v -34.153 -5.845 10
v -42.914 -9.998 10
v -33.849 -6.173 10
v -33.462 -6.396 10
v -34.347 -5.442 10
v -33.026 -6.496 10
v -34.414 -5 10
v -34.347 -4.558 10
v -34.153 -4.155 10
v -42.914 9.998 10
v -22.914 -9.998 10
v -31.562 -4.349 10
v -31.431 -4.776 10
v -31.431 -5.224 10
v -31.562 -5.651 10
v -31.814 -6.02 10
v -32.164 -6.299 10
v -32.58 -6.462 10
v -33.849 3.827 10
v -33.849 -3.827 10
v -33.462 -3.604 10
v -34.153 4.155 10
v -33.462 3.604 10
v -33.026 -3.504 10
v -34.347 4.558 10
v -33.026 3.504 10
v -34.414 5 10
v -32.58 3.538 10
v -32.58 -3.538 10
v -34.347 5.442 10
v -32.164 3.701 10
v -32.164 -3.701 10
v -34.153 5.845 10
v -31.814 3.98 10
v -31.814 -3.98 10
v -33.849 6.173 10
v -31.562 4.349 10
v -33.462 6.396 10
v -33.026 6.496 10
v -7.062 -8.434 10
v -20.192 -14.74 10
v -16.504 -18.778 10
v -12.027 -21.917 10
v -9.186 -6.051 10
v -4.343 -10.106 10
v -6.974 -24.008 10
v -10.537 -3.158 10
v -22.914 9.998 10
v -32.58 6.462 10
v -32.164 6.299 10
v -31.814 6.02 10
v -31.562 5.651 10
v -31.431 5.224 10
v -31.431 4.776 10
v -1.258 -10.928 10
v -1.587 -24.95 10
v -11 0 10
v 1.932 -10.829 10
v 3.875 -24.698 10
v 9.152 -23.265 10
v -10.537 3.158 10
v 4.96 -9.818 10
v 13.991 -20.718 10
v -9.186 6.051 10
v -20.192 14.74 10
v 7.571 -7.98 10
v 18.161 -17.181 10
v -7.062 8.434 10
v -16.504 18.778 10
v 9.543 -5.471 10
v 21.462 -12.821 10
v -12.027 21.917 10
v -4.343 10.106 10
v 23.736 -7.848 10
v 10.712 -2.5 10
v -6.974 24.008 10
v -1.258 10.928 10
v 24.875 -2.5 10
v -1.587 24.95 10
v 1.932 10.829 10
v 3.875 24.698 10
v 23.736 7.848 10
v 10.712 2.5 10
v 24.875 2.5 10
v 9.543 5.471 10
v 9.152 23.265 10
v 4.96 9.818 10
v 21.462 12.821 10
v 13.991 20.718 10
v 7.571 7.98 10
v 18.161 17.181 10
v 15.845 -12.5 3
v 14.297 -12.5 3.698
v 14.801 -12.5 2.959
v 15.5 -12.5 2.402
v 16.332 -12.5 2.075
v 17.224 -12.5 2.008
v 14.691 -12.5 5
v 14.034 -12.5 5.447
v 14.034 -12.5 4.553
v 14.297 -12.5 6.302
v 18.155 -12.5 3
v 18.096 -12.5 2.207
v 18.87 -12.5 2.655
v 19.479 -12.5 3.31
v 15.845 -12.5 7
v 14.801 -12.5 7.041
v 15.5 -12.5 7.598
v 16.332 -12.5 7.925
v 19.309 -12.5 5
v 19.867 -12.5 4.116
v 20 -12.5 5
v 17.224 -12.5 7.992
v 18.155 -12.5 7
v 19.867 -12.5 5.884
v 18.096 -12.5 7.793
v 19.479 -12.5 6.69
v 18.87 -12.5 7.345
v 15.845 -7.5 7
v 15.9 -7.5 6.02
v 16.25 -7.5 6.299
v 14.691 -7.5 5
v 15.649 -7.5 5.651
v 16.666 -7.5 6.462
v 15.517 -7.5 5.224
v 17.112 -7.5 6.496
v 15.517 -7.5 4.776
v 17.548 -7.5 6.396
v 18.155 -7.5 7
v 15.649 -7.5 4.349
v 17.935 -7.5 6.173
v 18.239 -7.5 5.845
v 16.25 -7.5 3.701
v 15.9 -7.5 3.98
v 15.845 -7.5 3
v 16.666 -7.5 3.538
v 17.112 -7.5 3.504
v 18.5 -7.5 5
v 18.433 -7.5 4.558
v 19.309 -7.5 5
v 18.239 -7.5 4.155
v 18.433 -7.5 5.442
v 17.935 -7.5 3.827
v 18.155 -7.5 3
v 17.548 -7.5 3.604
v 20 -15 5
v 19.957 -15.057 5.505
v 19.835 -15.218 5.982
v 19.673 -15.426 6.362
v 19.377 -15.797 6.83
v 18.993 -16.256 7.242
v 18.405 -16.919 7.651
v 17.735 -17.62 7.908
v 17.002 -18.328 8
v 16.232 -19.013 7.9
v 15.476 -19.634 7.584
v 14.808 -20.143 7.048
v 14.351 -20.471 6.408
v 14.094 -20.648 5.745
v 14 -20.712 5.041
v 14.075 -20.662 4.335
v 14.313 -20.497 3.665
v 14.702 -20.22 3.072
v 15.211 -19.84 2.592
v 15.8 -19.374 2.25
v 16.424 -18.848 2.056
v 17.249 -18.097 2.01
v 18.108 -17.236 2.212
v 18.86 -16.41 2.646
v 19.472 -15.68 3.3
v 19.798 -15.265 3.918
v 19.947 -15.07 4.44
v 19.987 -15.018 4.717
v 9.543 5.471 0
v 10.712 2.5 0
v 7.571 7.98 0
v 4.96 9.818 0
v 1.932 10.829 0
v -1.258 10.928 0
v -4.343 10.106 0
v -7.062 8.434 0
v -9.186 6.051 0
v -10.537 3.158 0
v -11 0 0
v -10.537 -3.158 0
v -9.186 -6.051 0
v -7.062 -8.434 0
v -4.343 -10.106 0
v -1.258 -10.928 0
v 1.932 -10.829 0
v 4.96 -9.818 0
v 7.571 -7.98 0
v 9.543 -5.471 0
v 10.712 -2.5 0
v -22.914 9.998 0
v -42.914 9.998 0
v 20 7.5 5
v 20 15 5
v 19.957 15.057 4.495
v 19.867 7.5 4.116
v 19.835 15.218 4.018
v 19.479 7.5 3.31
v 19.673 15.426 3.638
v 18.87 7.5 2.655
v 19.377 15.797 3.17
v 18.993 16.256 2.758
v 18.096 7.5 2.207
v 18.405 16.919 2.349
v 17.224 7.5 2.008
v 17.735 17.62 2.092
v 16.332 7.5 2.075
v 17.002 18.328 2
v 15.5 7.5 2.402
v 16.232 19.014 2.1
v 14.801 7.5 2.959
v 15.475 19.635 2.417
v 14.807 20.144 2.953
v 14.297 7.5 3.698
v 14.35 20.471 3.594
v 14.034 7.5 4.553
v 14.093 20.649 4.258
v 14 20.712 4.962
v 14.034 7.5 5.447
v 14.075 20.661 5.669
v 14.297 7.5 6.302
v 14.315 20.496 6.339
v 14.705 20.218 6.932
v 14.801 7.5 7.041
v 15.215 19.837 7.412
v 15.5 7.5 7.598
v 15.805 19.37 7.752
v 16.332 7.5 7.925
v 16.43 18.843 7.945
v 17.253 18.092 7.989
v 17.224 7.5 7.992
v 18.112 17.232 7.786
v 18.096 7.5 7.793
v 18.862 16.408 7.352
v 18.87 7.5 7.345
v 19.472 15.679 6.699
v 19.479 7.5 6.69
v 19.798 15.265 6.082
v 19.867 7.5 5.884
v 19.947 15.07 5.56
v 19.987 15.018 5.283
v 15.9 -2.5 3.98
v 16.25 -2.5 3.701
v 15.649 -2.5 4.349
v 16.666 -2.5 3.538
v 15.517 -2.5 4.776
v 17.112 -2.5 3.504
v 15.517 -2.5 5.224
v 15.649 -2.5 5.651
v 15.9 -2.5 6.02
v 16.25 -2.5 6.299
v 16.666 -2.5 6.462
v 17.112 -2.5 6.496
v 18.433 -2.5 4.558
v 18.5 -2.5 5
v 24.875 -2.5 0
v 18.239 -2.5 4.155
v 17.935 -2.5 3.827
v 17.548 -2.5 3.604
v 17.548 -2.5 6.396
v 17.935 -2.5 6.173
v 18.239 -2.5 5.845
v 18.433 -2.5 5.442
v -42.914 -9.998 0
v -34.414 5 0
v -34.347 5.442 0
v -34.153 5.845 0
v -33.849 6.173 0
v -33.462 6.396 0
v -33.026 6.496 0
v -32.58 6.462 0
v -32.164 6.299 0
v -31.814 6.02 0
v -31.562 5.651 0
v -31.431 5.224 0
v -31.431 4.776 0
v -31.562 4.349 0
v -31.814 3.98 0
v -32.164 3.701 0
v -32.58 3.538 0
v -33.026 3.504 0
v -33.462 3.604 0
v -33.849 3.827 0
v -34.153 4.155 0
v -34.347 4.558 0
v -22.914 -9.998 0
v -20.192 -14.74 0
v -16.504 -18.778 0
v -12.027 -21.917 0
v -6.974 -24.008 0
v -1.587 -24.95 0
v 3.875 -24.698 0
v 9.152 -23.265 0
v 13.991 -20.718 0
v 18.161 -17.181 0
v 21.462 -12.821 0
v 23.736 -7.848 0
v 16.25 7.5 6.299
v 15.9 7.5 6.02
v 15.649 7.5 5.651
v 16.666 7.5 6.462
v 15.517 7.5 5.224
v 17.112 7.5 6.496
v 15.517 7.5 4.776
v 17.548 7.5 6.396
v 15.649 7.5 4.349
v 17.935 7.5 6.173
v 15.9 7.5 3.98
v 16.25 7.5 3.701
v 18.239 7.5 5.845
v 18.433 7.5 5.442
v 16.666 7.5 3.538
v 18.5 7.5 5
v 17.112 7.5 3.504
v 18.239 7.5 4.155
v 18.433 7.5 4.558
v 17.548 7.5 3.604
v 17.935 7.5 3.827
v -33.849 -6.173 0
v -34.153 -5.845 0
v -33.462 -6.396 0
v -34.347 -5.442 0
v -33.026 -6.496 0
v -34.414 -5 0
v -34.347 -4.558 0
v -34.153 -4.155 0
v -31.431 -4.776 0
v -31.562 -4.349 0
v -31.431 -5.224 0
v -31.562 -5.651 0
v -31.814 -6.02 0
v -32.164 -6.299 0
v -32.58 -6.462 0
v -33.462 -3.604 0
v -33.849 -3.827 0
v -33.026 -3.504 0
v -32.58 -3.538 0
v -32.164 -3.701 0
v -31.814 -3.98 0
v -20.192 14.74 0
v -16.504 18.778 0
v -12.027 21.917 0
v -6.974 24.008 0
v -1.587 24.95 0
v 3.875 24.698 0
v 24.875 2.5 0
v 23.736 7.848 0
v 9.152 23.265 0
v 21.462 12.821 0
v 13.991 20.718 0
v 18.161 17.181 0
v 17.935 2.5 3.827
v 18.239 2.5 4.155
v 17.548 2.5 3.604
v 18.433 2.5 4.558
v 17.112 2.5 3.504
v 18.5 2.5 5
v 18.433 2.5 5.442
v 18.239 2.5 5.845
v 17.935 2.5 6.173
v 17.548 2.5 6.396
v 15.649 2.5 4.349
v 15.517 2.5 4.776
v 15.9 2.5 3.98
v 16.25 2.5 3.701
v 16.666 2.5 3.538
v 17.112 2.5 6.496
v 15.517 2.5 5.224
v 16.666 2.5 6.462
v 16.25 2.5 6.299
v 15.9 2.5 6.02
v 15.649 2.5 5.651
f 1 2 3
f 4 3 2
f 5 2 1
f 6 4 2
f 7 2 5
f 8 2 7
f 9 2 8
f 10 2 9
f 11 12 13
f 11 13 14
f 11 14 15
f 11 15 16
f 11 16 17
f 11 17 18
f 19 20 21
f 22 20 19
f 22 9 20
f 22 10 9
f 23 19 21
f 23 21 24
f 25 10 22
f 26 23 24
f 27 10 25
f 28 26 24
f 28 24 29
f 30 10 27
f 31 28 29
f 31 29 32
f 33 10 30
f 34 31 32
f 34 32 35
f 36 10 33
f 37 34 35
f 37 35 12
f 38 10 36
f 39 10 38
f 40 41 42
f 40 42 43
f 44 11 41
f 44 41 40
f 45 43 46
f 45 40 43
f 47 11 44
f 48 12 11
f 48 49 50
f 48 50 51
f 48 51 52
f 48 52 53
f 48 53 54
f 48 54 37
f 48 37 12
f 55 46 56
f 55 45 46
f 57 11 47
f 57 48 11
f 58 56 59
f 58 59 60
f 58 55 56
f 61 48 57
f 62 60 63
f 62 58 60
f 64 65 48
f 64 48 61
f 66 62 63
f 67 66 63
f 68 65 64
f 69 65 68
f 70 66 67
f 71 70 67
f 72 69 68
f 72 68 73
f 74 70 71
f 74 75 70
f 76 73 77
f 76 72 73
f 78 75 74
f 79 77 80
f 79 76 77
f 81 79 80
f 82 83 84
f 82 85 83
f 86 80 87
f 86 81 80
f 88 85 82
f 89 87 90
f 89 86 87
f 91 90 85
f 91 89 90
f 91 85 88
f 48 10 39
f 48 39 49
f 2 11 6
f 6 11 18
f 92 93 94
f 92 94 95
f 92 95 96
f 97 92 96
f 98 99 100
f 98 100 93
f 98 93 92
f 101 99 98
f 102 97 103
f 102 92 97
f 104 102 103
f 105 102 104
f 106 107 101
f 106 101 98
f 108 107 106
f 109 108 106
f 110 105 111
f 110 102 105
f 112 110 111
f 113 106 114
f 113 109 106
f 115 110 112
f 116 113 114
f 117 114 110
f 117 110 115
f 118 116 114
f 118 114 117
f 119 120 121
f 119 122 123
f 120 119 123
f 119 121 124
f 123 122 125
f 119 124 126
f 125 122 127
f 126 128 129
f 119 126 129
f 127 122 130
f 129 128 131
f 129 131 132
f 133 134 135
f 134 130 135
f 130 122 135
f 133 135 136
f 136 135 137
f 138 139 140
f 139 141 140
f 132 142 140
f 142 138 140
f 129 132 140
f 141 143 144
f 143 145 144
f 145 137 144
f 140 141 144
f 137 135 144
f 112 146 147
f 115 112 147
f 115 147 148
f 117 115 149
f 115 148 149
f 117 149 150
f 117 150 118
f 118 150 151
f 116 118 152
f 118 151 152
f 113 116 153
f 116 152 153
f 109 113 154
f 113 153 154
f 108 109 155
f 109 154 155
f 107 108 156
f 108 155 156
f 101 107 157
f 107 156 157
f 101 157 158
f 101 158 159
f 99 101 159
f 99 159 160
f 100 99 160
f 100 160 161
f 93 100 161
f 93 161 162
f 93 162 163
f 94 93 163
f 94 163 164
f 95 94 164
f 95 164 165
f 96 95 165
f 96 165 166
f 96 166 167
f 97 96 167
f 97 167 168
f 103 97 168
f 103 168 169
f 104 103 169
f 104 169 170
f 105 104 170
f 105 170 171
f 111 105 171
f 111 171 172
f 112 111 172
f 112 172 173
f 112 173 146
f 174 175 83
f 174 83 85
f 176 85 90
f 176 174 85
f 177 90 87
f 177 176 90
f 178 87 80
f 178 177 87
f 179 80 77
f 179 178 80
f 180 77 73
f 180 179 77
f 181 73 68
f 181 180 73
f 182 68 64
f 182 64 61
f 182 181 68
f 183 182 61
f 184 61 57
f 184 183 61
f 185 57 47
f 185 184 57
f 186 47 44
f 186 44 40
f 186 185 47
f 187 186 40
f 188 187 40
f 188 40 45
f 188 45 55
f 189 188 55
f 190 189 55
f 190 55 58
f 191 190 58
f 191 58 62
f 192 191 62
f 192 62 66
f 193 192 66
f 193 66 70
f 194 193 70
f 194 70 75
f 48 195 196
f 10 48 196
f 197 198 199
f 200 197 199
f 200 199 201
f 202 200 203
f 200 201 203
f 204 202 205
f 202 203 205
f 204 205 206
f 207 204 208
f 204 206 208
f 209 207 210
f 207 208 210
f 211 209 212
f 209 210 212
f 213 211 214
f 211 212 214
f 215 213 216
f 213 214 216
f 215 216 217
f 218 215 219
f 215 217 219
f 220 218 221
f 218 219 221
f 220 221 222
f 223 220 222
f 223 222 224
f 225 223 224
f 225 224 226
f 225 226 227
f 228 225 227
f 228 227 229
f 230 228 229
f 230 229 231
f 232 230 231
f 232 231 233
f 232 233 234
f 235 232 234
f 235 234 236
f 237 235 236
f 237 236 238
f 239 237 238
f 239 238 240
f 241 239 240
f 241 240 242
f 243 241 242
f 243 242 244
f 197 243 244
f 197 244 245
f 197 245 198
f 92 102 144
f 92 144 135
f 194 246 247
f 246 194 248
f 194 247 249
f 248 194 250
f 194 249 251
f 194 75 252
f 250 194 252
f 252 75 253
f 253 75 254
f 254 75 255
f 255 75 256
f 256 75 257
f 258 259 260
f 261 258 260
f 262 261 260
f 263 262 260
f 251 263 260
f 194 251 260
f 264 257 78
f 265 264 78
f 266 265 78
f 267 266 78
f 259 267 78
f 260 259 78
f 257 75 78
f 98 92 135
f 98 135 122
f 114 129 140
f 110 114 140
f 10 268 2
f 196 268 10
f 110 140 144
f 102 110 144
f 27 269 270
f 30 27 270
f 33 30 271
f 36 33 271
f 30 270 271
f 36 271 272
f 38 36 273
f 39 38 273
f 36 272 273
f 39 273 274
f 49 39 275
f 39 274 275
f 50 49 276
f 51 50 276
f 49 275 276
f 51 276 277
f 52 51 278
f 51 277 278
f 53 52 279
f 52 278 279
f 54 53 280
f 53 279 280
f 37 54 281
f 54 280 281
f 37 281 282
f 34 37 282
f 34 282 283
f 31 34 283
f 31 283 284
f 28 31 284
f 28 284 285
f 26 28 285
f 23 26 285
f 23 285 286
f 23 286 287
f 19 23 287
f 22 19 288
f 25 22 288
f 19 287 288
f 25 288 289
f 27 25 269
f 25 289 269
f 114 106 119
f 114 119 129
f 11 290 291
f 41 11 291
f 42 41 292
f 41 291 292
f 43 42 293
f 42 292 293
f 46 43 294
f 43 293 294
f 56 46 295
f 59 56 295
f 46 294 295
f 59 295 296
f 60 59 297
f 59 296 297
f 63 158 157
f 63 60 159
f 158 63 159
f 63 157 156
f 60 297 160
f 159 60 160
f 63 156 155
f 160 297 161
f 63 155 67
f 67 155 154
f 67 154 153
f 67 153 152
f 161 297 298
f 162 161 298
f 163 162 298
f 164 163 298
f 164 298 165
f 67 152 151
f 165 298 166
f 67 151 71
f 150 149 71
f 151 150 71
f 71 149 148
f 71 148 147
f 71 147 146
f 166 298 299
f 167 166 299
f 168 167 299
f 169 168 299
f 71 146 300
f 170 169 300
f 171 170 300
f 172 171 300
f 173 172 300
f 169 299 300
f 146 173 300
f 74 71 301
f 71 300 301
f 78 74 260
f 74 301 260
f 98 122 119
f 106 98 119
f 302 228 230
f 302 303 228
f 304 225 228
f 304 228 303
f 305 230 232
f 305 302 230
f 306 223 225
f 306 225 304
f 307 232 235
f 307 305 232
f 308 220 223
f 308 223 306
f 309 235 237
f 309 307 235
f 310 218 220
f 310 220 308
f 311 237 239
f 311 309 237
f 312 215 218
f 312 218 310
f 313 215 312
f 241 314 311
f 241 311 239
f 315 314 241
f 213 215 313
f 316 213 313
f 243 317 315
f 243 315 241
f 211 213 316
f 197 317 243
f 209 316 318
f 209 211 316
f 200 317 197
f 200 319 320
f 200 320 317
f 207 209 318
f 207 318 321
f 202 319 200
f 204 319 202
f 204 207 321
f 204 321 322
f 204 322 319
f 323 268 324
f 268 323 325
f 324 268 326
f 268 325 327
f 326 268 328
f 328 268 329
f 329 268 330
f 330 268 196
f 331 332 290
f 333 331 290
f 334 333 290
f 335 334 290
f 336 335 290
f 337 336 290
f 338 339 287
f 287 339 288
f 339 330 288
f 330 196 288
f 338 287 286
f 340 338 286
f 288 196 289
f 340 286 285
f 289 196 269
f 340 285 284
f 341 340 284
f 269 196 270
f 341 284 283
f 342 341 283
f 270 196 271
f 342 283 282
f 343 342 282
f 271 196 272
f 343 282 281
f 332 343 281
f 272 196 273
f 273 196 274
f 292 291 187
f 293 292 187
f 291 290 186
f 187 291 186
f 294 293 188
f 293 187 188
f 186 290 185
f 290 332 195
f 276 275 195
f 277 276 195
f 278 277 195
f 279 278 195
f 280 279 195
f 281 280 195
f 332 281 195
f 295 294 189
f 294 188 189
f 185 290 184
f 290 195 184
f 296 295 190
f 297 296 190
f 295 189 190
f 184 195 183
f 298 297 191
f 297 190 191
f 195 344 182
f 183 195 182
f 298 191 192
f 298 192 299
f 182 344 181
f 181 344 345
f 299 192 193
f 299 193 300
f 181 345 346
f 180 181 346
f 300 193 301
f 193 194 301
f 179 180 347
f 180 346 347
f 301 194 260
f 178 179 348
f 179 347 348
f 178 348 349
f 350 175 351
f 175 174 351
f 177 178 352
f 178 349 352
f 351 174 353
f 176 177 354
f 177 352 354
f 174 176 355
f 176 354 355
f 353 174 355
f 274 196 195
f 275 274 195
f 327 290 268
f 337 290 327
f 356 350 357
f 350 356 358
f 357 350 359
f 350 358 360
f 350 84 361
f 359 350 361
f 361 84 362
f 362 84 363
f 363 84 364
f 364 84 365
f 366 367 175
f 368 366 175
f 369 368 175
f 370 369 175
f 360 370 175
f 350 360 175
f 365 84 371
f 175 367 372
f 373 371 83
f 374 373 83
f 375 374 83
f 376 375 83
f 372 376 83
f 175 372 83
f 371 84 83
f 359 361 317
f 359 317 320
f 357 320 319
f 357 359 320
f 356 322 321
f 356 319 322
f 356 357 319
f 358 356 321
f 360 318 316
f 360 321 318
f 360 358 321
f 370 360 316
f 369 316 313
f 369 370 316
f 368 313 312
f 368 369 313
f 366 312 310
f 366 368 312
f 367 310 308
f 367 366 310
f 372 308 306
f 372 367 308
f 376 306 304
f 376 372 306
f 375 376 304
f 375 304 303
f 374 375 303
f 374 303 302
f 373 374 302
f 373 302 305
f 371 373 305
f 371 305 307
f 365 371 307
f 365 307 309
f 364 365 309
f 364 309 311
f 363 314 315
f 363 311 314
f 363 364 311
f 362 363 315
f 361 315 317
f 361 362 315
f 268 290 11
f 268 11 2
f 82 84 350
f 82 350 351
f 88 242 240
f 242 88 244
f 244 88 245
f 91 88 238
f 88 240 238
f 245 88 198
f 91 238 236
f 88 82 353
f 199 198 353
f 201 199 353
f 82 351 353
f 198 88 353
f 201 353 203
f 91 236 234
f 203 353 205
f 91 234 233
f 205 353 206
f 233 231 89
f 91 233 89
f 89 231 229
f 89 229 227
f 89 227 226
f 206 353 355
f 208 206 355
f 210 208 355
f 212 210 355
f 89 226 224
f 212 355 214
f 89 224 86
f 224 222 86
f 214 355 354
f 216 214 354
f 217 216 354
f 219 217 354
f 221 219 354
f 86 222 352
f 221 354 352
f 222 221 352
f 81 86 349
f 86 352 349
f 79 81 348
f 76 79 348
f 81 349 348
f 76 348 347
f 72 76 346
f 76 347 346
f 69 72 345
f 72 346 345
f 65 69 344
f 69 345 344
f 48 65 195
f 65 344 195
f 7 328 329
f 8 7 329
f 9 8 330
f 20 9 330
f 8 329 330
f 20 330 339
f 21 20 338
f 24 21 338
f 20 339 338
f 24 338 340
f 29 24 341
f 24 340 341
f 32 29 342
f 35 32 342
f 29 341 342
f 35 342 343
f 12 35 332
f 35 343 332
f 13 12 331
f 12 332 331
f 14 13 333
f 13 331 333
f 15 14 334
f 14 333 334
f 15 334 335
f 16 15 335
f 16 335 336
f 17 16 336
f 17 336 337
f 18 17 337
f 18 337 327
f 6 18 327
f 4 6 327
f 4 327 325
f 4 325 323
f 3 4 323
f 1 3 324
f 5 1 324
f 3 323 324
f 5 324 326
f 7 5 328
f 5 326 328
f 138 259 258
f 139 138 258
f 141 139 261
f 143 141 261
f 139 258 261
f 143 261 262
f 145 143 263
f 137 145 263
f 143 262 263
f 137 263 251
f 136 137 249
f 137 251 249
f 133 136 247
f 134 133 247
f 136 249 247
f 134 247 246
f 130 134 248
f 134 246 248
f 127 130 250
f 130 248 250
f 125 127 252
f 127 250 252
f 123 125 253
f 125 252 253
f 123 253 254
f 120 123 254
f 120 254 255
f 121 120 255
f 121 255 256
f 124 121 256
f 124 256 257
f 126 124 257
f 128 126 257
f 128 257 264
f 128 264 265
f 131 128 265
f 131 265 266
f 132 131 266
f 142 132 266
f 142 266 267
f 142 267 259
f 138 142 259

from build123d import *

# Parameters (mm, degrees)
SKETCH1_R               = 25
SKETCH1_R_2             = 11
BOSS_EXTRUDE1_DEPTH     = 10
CUT_EXTRUDE1_DEPTH      = 10
SKETCH5_R               = 1.5
CUT_EXTRUDE4_DEPTH      = 28.5
CUT_EXTRUDE4_DEPTH_BACK = 23.5
CUT_EXTRUDE5_START      = 30
SKETCH6_R               = 3
CUT_EXTRUDE5_DEPTH      = 20
CUT_EXTRUDE6_START      = -30
CUT_EXTRUDE6_DEPTH      = 25
CUT_EXTRUDE8_START      = 20
SKETCH8_R               = 3
CUT_EXTRUDE8_DEPTH      = 15
SKETCH9_W               = 20
SKETCH9_H               = 19.995459106
SKETCH9_R               = 1.5
BOSS_EXTRUDE2_DEPTH     = 10


with BuildPart() as part:
    # Sketch1 → Boss-Extrude1 (new body)
    with BuildSketch(Plane.XY):
        Circle(SKETCH1_R)
        Circle(SKETCH1_R_2, mode=Mode.SUBTRACT)
    extrude(amount=BOSS_EXTRUDE1_DEPTH)

    # Sketch2 → Cut-Extrude1 (cut)
    with BuildSketch(Plane.XY.offset(10)):
        Polygon((25, 0), (25, 2.5), (0, 2.5), (0, 0), (0, -2.5), (25, -2.5), align=None)
    extrude(amount=-CUT_EXTRUDE1_DEPTH, mode=Mode.SUBTRACT)

    # Sketch5 → Cut-Extrude4 (cut, two sides)
    with BuildSketch(Plane(origin=(0, -2.5, 0), x_dir=(1, 0, 0), z_dir=(0, 1, 0))) as cut_extrude4_sk:
        with Locations((17, -5)):
            Circle(SKETCH5_R)
    extrude(amount=CUT_EXTRUDE4_DEPTH, mode=Mode.SUBTRACT)
    extrude(cut_extrude4_sk.sketch, amount=-CUT_EXTRUDE4_DEPTH_BACK, mode=Mode.SUBTRACT)

    # Sketch6 → Cut-Extrude5 (cut)
    with BuildSketch(Plane(origin=(0, -2.5, 0), x_dir=(1, 0, 0), z_dir=(0, 1, 0)).offset(CUT_EXTRUDE5_START)):
        with Locations((17, -5)):
            Circle(SKETCH6_R)
    extrude(amount=-CUT_EXTRUDE5_DEPTH, mode=Mode.SUBTRACT)

    # Sketch7 → Cut-Extrude6 (cut)
    with BuildSketch(Plane(origin=(0, -2.5, 0), x_dir=(1, 0, 0), z_dir=(0, 1, 0)).offset(CUT_EXTRUDE6_START)):
        Polygon((19.309401077, -5), (18.154700538, -3), (15.845299462, -3), (14.690598923, -5), (15.845299462, -7), (18.154700538, -7), align=None)
    extrude(amount=CUT_EXTRUDE6_DEPTH, mode=Mode.SUBTRACT)

    # Sketch8 → Cut-Extrude8 (cut)
    with BuildSketch(Plane.XZ.offset(7.5).offset(CUT_EXTRUDE8_START)):
        with Locations((17, 5)):
            Circle(SKETCH8_R)
    extrude(amount=-CUT_EXTRUDE8_DEPTH, mode=Mode.SUBTRACT)

    # Sketch9 → Boss-Extrude2 (add)
    with BuildSketch(Plane(origin=(0, 0, 0), x_dir=(-1, 0, 0), z_dir=(0, 0, -1))):
        with Locations((32.913869245, 0)):
            Rectangle(SKETCH9_W, SKETCH9_H)
        with Locations((32.913869245, 5)):
            Circle(SKETCH9_R, mode=Mode.SUBTRACT)
        with Locations((32.913869245, -5)):
            Circle(SKETCH9_R, mode=Mode.SUBTRACT)
    extrude(amount=-BOSS_EXTRUDE2_DEPTH)


solid = part.part
